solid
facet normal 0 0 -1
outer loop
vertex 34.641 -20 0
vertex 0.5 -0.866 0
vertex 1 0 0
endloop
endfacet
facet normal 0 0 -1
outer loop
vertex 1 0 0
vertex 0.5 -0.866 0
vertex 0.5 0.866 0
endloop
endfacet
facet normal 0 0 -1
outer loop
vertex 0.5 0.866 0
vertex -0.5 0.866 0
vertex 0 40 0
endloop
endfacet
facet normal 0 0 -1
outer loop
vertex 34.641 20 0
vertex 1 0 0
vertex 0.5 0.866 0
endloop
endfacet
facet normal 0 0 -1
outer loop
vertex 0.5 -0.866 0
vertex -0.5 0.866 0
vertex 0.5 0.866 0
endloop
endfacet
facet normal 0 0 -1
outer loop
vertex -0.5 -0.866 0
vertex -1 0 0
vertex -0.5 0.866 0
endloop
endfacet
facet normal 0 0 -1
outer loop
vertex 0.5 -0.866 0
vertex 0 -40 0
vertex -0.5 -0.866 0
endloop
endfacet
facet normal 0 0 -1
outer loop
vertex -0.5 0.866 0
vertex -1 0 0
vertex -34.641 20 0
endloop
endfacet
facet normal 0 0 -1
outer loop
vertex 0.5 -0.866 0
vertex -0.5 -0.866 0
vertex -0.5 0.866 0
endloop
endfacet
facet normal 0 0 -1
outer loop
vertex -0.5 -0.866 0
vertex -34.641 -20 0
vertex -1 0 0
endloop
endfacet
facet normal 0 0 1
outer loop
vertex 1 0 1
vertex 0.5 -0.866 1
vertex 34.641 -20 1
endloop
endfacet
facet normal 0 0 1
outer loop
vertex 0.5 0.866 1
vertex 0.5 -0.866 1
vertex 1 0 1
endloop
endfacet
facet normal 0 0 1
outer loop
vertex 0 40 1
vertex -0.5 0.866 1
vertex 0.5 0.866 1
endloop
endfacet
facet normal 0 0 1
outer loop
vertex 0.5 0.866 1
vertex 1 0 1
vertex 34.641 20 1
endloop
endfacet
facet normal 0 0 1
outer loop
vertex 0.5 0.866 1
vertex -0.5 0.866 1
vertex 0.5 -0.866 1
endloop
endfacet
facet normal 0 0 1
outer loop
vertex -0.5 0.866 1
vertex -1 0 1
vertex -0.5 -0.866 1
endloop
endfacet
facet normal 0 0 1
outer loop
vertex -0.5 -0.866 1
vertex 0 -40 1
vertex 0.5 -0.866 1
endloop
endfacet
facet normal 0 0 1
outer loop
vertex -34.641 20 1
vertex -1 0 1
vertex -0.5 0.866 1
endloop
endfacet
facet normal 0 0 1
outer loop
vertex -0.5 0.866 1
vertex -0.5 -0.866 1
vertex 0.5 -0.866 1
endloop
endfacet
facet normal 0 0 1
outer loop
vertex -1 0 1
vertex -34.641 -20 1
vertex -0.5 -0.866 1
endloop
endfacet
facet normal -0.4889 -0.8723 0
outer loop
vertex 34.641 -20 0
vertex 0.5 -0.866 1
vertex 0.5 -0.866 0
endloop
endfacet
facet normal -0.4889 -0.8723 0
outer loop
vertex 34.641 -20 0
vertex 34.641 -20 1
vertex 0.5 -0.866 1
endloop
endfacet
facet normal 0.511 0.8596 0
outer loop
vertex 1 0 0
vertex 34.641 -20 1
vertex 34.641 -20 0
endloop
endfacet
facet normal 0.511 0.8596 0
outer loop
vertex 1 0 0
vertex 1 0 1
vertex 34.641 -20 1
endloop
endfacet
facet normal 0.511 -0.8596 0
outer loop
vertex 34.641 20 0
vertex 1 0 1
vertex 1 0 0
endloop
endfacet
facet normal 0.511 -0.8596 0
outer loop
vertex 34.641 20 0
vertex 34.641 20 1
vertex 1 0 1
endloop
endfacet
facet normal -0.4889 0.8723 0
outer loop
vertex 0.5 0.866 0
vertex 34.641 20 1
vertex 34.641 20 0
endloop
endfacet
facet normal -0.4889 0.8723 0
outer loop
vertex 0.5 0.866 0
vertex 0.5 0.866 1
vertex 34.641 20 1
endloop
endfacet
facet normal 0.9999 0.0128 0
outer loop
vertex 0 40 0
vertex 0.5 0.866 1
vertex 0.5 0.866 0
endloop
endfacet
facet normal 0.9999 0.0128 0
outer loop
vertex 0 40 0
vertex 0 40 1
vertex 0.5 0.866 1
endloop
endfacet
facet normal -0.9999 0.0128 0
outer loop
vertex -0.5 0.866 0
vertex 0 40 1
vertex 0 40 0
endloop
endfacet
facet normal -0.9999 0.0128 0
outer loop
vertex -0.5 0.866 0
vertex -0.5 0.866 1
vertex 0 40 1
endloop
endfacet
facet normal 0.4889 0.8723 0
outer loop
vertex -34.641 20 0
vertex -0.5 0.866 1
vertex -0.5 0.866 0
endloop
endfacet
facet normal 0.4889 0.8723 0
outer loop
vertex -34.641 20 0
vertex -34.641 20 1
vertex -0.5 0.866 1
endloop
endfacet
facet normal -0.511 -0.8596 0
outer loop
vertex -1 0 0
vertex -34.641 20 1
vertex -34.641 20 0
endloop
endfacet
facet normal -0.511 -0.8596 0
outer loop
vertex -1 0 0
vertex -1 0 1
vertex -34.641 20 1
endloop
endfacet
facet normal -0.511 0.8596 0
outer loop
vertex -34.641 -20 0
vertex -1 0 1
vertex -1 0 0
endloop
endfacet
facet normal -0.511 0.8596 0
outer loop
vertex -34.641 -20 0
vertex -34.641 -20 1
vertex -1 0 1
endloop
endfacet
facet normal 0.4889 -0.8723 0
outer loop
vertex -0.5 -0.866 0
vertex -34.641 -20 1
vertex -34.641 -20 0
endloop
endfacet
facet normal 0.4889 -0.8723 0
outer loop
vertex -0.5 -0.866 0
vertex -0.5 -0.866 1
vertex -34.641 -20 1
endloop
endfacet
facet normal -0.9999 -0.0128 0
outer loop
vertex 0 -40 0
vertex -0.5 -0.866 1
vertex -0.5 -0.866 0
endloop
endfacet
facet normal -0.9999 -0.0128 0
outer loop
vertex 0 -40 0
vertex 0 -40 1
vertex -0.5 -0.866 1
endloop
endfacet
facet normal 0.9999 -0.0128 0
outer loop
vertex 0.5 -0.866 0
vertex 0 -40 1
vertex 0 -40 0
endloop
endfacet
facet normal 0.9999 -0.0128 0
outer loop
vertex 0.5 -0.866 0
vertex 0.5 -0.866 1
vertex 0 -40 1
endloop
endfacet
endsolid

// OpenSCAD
// With recursive functions very complex results can be generated,
// e.g. calculating the outline of a star shaped polygon. Using
// default parameters can help with simplifying the usage of functions
// that have multiple parameters.
function point(angle) = [ sin(angle), cos(angle) ];
function radius(i, r1, r2) = (i % 2) == 0 ? r1 : r2;
function star_f(count, r1, r2, i = 0, result = []) = i < count
    ? star_f(count, r1, r2, i + 1, concat(result, [ radius(i, r1, r2) * point(360 / count * i) ]))
    : result;


module star(points, r1, r2, h=1){
    count = points*2;
        linear_extrude(height = h)
            polygon(star_f(count, r1, r2));
}

//color("yellow")
//    //translate([0, 50, 0])
//        linear_extrude(height = 1)
//            polygon(star_f(30, 40, 10));

star(6, 40, 1, h=1);
